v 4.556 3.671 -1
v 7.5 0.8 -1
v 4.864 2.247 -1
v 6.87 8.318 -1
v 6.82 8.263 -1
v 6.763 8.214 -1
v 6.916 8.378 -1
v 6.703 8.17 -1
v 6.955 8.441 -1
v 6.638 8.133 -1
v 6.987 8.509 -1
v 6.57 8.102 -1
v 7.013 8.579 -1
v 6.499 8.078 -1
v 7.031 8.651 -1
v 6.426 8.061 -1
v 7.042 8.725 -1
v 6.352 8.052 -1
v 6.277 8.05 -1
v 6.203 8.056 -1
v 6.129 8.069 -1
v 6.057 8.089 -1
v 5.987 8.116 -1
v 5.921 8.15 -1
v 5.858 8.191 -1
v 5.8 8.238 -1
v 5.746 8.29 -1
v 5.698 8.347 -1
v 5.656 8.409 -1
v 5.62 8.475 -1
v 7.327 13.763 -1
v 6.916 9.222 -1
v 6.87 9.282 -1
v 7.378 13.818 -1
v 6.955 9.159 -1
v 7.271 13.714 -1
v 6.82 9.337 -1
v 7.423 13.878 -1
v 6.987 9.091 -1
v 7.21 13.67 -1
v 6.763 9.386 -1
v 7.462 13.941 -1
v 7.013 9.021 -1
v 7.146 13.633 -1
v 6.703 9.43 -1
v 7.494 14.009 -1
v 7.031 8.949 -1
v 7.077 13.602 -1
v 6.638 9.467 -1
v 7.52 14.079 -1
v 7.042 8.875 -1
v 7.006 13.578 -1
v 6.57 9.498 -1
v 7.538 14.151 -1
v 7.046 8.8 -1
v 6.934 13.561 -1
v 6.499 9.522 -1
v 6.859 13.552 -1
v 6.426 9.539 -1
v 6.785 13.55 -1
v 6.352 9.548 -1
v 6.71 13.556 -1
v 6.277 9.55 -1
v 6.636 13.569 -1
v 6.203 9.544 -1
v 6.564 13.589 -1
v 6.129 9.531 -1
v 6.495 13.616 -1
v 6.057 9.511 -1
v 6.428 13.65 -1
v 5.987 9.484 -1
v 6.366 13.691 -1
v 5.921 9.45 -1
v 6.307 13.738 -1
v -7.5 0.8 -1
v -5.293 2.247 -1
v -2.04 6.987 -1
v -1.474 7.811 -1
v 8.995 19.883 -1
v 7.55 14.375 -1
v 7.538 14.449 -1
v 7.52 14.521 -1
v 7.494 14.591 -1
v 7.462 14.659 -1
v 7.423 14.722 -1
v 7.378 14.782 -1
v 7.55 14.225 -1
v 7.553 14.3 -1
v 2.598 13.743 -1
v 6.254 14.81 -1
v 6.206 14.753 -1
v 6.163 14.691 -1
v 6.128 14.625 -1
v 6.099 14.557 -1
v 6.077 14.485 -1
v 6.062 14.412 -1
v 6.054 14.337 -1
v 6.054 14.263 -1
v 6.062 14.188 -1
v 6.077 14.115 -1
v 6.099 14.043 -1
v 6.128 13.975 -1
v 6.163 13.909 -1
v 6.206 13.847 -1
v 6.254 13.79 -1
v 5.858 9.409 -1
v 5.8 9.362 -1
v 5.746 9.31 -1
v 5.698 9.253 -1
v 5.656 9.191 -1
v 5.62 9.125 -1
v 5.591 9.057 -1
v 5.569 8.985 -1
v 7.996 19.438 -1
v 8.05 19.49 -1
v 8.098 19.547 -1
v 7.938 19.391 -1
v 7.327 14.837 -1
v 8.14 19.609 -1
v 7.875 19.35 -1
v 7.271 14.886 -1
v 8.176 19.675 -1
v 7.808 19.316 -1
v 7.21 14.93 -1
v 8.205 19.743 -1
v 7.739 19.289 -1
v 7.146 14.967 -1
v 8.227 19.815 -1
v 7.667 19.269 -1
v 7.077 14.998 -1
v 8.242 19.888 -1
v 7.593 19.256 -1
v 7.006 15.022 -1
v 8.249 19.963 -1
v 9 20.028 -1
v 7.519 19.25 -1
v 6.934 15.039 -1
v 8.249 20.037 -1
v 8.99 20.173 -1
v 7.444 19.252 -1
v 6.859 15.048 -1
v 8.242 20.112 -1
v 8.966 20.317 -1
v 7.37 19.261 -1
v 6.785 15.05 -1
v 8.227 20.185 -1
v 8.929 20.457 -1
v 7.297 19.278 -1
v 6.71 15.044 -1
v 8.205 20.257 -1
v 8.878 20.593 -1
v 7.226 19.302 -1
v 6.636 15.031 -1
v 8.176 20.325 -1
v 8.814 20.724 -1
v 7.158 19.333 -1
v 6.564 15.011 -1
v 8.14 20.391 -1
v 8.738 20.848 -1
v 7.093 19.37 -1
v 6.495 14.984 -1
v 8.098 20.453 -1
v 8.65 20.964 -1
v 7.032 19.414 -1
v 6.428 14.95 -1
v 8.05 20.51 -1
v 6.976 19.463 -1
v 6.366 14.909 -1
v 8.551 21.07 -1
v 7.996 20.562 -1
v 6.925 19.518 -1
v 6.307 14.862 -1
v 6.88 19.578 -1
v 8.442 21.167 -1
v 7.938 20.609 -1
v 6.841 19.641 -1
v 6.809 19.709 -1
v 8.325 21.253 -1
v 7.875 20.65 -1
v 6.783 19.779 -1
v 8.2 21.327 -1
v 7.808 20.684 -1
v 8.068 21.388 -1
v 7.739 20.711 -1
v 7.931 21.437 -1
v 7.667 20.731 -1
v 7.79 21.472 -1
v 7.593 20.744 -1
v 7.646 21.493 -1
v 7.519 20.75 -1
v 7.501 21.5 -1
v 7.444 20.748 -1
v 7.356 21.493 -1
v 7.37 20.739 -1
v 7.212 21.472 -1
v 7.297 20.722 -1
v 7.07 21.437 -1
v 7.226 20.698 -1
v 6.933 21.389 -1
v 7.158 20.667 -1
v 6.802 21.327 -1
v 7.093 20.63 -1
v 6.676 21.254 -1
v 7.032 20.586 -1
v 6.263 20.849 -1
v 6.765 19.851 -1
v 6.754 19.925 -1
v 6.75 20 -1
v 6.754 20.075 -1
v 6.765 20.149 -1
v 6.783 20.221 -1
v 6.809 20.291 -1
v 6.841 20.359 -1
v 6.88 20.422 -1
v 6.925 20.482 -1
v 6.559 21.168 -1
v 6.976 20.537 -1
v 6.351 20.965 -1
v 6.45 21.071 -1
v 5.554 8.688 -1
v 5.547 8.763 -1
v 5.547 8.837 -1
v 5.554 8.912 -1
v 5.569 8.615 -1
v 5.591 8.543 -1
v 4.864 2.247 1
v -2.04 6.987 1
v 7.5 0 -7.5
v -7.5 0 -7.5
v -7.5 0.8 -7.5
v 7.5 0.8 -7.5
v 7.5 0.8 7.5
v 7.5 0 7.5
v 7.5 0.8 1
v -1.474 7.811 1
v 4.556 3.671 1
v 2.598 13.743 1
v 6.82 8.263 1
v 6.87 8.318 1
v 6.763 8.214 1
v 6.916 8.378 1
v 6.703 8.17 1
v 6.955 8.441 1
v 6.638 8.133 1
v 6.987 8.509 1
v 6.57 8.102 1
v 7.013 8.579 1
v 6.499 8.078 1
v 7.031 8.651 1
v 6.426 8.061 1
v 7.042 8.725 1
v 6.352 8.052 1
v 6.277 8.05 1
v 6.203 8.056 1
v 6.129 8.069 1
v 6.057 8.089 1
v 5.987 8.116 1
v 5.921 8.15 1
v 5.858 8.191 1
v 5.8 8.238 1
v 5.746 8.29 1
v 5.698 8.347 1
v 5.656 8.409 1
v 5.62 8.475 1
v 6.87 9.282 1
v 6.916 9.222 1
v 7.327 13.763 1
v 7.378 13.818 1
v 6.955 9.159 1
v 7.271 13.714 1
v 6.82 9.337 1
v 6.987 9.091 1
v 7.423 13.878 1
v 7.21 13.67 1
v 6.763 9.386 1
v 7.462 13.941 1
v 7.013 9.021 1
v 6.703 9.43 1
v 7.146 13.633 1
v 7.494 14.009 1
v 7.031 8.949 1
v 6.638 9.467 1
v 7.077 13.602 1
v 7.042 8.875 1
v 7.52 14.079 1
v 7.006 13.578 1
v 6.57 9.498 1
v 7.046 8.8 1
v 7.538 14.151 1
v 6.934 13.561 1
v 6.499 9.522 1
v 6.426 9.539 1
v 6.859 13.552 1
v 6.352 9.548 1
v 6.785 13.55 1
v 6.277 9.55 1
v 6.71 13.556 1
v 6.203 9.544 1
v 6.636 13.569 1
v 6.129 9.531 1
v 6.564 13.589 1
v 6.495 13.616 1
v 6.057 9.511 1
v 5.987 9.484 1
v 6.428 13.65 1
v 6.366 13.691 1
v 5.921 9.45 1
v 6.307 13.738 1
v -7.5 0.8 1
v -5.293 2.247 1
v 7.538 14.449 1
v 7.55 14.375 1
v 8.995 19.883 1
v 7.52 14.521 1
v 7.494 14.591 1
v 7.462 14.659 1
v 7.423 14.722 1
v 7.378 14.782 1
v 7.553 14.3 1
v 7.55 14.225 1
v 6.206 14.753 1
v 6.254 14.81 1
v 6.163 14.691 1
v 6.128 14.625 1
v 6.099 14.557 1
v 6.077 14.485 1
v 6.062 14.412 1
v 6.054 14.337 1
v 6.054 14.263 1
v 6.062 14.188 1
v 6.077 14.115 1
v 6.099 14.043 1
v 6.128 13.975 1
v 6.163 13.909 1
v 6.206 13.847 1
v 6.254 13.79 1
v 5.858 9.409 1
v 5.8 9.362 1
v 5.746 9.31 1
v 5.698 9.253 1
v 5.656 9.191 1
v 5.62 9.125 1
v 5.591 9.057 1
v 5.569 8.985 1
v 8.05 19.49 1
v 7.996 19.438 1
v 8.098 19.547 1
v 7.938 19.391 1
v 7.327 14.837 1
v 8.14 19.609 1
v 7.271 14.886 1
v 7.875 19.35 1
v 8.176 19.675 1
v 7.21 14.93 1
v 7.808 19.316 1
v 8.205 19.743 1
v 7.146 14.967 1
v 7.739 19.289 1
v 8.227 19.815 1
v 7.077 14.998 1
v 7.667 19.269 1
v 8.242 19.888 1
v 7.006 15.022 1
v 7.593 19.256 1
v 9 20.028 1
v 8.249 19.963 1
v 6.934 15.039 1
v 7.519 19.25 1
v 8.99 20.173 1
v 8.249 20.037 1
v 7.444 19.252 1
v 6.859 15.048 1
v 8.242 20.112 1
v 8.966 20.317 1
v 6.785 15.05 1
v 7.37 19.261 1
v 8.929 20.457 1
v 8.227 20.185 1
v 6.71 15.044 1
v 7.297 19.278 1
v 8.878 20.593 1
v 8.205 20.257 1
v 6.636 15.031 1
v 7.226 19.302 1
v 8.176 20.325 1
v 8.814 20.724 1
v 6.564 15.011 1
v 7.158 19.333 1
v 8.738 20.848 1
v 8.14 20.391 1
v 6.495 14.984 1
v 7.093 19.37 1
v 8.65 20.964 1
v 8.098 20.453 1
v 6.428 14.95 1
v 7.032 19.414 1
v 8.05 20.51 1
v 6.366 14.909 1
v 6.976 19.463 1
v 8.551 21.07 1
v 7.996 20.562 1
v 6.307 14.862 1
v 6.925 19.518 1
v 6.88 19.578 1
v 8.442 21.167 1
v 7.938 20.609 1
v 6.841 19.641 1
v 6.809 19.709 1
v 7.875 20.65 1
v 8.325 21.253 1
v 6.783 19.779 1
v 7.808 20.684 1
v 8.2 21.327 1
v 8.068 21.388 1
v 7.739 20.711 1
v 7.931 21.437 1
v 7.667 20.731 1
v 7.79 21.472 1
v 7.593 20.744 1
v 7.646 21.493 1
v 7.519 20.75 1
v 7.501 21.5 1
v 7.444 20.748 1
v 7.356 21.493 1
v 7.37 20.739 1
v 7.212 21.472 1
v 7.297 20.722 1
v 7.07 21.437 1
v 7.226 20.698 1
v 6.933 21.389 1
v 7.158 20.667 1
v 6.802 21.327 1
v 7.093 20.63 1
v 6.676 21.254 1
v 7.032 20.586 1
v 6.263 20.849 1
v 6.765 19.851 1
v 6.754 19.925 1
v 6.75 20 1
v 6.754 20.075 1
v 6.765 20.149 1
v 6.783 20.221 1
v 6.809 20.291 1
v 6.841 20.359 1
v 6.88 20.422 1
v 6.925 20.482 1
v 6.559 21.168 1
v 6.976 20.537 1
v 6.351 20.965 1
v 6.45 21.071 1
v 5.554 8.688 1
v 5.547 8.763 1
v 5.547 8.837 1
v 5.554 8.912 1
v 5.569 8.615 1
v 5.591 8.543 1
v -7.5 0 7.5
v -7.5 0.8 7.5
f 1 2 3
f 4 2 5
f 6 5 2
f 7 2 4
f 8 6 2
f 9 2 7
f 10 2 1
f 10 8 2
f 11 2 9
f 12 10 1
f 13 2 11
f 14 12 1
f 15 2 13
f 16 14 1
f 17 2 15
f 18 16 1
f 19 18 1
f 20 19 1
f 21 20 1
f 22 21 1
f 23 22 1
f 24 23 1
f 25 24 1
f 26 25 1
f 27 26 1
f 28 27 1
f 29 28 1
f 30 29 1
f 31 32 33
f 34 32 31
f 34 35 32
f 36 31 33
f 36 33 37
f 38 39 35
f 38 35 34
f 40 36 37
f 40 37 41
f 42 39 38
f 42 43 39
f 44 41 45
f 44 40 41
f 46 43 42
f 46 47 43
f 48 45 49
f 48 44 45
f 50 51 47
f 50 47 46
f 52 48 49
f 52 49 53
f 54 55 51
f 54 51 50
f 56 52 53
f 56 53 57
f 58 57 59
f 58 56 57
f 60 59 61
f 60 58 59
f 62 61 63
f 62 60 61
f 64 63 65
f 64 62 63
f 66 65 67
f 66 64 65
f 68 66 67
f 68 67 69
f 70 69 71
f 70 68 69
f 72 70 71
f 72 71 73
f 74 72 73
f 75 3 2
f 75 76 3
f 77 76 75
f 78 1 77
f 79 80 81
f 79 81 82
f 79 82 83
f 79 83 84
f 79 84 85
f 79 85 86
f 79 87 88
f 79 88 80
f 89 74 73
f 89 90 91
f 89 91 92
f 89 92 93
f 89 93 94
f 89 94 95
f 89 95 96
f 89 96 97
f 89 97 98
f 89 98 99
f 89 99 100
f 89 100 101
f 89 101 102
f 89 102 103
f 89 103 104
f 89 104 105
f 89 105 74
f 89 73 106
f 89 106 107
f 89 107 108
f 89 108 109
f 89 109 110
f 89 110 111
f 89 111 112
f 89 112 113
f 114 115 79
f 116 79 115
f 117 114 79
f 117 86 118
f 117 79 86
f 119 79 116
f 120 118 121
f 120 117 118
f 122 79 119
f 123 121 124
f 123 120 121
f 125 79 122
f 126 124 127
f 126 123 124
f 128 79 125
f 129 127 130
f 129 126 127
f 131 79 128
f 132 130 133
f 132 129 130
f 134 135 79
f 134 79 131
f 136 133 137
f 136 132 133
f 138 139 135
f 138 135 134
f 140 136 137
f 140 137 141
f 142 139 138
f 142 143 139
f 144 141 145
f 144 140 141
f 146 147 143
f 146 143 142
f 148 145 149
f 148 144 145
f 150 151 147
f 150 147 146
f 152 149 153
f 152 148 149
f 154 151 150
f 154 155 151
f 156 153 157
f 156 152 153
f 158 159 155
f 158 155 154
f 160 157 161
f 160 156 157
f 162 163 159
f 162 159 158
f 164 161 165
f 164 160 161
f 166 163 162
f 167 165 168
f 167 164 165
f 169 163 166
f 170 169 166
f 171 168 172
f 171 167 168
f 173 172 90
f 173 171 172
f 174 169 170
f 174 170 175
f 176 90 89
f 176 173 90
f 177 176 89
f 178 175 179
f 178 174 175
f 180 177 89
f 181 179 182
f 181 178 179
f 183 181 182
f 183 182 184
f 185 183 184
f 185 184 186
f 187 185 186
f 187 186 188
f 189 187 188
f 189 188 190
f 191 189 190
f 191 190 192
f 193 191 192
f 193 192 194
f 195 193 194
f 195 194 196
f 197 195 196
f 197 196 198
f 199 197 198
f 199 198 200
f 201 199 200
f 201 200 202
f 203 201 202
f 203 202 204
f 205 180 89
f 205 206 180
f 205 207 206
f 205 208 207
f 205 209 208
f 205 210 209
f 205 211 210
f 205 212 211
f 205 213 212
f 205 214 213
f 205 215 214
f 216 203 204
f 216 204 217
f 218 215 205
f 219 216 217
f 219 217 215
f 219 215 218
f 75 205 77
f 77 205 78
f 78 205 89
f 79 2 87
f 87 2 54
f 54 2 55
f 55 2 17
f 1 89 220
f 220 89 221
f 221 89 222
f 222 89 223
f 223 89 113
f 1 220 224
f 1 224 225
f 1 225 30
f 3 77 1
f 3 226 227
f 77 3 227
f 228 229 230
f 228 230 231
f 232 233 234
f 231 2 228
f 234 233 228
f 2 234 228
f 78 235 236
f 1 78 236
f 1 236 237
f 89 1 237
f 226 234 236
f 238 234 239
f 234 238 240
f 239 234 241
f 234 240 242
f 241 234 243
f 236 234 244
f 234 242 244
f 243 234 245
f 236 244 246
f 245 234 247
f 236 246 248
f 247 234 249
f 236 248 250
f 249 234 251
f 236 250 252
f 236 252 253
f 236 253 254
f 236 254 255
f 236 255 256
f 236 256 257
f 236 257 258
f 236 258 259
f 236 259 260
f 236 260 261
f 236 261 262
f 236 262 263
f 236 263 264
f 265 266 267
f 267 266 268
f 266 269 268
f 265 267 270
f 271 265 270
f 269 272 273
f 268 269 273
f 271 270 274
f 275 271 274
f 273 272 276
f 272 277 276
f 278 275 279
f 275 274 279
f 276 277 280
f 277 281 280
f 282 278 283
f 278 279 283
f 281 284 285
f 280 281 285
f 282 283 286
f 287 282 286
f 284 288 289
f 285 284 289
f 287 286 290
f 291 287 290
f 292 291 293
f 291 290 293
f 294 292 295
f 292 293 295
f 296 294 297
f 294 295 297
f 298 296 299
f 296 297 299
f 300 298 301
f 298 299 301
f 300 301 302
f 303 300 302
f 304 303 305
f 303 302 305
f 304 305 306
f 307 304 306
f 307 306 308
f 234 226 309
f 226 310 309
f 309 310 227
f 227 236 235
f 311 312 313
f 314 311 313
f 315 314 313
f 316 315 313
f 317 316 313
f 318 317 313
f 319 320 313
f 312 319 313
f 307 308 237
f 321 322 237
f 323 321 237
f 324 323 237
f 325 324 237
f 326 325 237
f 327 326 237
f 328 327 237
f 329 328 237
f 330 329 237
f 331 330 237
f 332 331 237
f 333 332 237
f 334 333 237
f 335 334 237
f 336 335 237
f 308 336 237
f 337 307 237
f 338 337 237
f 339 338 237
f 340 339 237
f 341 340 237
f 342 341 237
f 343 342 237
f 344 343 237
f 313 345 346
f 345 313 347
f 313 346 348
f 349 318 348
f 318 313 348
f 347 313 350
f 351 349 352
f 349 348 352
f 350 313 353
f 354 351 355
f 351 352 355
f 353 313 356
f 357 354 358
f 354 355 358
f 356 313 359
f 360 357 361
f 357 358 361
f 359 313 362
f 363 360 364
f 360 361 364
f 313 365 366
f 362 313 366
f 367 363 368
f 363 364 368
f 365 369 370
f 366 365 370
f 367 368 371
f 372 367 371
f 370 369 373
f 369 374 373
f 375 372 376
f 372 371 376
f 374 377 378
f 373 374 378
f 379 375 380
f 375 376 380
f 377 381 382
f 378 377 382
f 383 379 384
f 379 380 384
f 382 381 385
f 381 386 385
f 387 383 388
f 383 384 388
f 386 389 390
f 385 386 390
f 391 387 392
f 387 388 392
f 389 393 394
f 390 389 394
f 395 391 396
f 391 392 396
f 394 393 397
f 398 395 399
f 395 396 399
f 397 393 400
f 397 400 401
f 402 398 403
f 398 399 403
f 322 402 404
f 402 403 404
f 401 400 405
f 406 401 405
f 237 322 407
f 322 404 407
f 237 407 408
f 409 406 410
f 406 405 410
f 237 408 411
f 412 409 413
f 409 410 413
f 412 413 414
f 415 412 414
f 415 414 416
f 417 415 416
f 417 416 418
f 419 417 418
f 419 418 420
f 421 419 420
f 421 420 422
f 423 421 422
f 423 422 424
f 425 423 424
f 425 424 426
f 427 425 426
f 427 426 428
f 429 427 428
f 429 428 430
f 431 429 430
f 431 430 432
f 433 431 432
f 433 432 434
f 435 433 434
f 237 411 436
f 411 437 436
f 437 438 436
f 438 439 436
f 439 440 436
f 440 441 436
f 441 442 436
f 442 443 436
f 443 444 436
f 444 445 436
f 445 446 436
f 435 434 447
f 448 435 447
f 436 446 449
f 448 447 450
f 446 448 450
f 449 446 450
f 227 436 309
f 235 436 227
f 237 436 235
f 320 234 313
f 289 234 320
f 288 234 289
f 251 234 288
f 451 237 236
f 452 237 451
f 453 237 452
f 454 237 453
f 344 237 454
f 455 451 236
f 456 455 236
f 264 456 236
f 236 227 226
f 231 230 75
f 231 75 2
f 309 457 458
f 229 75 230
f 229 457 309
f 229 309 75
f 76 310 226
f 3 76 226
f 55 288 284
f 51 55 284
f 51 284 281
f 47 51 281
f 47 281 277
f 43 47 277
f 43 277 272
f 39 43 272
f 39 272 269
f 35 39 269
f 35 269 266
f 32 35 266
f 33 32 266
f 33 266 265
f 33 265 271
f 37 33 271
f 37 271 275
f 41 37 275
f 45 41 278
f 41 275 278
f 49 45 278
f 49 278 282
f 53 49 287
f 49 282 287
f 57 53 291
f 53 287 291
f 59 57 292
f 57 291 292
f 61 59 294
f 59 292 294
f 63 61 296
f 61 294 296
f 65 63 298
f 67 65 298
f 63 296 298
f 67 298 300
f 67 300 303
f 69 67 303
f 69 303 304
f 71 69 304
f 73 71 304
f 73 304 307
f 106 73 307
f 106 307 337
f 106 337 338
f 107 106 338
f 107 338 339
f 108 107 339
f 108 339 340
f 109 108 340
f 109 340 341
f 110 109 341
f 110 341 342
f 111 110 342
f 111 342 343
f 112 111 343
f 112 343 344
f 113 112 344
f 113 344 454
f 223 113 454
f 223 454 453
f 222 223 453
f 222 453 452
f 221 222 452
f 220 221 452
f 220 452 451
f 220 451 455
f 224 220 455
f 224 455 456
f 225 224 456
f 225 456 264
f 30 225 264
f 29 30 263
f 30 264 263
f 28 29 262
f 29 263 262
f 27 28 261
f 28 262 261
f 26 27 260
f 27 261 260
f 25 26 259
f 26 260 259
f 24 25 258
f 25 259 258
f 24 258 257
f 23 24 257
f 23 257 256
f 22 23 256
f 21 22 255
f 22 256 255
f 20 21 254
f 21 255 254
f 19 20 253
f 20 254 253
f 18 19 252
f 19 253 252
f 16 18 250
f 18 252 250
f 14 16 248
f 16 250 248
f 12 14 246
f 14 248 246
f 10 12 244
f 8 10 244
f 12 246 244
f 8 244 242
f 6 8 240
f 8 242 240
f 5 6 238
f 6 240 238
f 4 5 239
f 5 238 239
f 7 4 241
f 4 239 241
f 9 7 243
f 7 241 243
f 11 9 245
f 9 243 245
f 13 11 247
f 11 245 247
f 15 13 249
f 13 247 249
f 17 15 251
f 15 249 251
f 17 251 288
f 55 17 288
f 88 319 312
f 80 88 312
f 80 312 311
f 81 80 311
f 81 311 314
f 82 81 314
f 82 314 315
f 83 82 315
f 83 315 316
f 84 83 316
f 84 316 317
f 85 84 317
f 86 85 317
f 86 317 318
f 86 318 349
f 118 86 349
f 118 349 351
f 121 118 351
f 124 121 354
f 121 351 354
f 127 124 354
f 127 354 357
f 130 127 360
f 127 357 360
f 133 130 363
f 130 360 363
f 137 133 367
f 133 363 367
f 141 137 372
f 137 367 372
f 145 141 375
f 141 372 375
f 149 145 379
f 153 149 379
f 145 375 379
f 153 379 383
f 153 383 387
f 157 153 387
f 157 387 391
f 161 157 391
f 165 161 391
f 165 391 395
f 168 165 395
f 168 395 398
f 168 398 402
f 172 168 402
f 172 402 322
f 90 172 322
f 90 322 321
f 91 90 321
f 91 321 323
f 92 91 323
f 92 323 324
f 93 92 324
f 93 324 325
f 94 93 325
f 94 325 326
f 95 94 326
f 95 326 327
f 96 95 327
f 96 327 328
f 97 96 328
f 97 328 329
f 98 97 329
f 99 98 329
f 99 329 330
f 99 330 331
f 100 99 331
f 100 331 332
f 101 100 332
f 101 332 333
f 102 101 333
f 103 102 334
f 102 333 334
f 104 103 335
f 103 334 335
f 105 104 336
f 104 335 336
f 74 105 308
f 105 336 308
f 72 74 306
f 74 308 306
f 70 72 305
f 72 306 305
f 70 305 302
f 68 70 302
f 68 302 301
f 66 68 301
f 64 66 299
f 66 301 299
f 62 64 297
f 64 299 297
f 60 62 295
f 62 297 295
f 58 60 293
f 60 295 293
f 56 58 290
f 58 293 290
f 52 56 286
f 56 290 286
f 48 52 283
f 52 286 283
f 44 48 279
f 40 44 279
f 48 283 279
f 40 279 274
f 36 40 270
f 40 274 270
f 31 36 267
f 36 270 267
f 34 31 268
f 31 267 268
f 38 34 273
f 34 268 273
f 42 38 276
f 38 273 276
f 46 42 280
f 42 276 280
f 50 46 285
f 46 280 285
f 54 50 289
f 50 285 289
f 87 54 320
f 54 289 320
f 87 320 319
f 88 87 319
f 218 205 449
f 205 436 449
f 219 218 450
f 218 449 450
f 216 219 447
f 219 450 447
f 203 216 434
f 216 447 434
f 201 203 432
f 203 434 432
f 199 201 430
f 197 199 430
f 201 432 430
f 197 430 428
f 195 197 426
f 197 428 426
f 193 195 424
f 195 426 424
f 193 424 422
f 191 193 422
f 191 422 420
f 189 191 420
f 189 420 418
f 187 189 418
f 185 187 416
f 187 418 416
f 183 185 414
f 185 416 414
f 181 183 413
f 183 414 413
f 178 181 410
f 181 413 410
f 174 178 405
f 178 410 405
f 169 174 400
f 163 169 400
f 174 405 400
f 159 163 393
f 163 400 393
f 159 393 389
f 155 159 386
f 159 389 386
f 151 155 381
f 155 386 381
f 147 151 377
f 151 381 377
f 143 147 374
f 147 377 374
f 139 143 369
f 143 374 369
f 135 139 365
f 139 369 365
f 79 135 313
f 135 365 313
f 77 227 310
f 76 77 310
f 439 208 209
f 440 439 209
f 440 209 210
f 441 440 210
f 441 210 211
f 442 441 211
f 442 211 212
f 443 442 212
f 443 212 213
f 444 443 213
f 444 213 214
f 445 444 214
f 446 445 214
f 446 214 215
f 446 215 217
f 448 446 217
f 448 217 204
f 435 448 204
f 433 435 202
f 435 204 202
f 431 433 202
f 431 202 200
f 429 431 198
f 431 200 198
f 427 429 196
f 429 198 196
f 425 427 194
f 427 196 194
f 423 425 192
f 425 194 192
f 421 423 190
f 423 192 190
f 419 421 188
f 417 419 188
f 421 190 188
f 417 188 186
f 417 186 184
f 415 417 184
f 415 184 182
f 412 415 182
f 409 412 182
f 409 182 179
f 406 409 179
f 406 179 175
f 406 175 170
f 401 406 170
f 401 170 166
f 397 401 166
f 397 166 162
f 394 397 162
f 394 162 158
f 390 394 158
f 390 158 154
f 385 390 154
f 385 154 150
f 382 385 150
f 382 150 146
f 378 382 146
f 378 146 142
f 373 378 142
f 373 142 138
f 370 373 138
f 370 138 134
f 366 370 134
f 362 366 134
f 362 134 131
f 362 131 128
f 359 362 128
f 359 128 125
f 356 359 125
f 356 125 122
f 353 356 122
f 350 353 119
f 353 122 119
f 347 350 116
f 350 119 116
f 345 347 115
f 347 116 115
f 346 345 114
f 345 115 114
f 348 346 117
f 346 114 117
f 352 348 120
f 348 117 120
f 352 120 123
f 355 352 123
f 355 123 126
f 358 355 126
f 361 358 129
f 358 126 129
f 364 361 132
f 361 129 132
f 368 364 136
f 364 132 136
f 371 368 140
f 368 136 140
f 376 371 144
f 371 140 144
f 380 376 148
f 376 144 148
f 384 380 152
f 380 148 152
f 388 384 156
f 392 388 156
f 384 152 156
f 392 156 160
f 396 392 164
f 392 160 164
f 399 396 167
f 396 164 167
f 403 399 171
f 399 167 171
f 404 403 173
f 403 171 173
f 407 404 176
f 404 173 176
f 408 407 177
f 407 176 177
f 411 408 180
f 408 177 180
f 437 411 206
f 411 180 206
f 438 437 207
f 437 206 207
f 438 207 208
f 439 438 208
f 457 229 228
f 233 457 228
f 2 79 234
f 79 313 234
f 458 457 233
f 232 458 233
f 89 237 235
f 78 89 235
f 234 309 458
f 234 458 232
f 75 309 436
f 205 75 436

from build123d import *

# Parameters (mm, degrees)
SKETCH1_W           = 15
SKETCH1_H           = 15
BOSS_EXTRUDE1_DEPTH = 0.8
BOSS_EXTRUDE2_DEPTH = 1
SKETCH3_R           = 0.75
CUT_EXTRUDE2_DEPTH  = 9.5
SKETCH6_R           = 0.75
CUT_EXTRUDE3_DEPTH  = 70


with BuildPart() as part:
    # Sketch1 → Boss-Extrude1 (new body)
    with BuildSketch(Plane(origin=(0, 0, 0), x_dir=(1, 0, 0), z_dir=(0, 1, 0))):
        Rectangle(SKETCH1_W, SKETCH1_H)
    extrude(amount=BOSS_EXTRUDE1_DEPTH)

    # Sketch2 → Boss-Extrude2 (add, symmetric)
    with BuildSketch(Plane.XY):
        with BuildLine():
            Line((-7.5, 0.8), (6.263352991, 20.848942976))
            ThreePointArc((6.263352991, 20.848942976), (8.00009228, 21.414180933), (8.995415357, 19.8828125))
            Line((8.995415357, 19.8828125), (7.5, 0.8))
            Line((7.5, 0.8), (-7.5, 0.8))
        make_face()
    extrude(amount=BOSS_EXTRUDE2_DEPTH, both=True)

    # Sketch3 → Cut-Extrude2 (cut, through all)
    with BuildSketch(Plane(origin=(0, 0, -1), x_dir=(-1, 0, 0), z_dir=(0, 0, -1))):
        with Locations((-7.5, 20)):
            Circle(SKETCH3_R)
    extrude(amount=-CUT_EXTRUDE2_DEPTH, mode=Mode.SUBTRACT)

    # Sketch6 → Cut-Extrude3 (cut)
    with BuildSketch(Plane.XY.offset(1)):
        with Locations((6.803358906, 14.3)):
            Circle(SKETCH6_R)
        with Locations((6.295860941, 8.8)):
            Circle(SKETCH6_R)
        Polygon((-2.039936244, 6.986718852), (-5.293464788, 2.247335339), (4.863877808, 2.247335339), align=None)
        Polygon((-1.47397426, 7.811150191), (4.556357867, 3.671401287), (2.597993052, 13.742745529), align=None)
    extrude(amount=-CUT_EXTRUDE3_DEPTH, mode=Mode.SUBTRACT)


solid = part.part
